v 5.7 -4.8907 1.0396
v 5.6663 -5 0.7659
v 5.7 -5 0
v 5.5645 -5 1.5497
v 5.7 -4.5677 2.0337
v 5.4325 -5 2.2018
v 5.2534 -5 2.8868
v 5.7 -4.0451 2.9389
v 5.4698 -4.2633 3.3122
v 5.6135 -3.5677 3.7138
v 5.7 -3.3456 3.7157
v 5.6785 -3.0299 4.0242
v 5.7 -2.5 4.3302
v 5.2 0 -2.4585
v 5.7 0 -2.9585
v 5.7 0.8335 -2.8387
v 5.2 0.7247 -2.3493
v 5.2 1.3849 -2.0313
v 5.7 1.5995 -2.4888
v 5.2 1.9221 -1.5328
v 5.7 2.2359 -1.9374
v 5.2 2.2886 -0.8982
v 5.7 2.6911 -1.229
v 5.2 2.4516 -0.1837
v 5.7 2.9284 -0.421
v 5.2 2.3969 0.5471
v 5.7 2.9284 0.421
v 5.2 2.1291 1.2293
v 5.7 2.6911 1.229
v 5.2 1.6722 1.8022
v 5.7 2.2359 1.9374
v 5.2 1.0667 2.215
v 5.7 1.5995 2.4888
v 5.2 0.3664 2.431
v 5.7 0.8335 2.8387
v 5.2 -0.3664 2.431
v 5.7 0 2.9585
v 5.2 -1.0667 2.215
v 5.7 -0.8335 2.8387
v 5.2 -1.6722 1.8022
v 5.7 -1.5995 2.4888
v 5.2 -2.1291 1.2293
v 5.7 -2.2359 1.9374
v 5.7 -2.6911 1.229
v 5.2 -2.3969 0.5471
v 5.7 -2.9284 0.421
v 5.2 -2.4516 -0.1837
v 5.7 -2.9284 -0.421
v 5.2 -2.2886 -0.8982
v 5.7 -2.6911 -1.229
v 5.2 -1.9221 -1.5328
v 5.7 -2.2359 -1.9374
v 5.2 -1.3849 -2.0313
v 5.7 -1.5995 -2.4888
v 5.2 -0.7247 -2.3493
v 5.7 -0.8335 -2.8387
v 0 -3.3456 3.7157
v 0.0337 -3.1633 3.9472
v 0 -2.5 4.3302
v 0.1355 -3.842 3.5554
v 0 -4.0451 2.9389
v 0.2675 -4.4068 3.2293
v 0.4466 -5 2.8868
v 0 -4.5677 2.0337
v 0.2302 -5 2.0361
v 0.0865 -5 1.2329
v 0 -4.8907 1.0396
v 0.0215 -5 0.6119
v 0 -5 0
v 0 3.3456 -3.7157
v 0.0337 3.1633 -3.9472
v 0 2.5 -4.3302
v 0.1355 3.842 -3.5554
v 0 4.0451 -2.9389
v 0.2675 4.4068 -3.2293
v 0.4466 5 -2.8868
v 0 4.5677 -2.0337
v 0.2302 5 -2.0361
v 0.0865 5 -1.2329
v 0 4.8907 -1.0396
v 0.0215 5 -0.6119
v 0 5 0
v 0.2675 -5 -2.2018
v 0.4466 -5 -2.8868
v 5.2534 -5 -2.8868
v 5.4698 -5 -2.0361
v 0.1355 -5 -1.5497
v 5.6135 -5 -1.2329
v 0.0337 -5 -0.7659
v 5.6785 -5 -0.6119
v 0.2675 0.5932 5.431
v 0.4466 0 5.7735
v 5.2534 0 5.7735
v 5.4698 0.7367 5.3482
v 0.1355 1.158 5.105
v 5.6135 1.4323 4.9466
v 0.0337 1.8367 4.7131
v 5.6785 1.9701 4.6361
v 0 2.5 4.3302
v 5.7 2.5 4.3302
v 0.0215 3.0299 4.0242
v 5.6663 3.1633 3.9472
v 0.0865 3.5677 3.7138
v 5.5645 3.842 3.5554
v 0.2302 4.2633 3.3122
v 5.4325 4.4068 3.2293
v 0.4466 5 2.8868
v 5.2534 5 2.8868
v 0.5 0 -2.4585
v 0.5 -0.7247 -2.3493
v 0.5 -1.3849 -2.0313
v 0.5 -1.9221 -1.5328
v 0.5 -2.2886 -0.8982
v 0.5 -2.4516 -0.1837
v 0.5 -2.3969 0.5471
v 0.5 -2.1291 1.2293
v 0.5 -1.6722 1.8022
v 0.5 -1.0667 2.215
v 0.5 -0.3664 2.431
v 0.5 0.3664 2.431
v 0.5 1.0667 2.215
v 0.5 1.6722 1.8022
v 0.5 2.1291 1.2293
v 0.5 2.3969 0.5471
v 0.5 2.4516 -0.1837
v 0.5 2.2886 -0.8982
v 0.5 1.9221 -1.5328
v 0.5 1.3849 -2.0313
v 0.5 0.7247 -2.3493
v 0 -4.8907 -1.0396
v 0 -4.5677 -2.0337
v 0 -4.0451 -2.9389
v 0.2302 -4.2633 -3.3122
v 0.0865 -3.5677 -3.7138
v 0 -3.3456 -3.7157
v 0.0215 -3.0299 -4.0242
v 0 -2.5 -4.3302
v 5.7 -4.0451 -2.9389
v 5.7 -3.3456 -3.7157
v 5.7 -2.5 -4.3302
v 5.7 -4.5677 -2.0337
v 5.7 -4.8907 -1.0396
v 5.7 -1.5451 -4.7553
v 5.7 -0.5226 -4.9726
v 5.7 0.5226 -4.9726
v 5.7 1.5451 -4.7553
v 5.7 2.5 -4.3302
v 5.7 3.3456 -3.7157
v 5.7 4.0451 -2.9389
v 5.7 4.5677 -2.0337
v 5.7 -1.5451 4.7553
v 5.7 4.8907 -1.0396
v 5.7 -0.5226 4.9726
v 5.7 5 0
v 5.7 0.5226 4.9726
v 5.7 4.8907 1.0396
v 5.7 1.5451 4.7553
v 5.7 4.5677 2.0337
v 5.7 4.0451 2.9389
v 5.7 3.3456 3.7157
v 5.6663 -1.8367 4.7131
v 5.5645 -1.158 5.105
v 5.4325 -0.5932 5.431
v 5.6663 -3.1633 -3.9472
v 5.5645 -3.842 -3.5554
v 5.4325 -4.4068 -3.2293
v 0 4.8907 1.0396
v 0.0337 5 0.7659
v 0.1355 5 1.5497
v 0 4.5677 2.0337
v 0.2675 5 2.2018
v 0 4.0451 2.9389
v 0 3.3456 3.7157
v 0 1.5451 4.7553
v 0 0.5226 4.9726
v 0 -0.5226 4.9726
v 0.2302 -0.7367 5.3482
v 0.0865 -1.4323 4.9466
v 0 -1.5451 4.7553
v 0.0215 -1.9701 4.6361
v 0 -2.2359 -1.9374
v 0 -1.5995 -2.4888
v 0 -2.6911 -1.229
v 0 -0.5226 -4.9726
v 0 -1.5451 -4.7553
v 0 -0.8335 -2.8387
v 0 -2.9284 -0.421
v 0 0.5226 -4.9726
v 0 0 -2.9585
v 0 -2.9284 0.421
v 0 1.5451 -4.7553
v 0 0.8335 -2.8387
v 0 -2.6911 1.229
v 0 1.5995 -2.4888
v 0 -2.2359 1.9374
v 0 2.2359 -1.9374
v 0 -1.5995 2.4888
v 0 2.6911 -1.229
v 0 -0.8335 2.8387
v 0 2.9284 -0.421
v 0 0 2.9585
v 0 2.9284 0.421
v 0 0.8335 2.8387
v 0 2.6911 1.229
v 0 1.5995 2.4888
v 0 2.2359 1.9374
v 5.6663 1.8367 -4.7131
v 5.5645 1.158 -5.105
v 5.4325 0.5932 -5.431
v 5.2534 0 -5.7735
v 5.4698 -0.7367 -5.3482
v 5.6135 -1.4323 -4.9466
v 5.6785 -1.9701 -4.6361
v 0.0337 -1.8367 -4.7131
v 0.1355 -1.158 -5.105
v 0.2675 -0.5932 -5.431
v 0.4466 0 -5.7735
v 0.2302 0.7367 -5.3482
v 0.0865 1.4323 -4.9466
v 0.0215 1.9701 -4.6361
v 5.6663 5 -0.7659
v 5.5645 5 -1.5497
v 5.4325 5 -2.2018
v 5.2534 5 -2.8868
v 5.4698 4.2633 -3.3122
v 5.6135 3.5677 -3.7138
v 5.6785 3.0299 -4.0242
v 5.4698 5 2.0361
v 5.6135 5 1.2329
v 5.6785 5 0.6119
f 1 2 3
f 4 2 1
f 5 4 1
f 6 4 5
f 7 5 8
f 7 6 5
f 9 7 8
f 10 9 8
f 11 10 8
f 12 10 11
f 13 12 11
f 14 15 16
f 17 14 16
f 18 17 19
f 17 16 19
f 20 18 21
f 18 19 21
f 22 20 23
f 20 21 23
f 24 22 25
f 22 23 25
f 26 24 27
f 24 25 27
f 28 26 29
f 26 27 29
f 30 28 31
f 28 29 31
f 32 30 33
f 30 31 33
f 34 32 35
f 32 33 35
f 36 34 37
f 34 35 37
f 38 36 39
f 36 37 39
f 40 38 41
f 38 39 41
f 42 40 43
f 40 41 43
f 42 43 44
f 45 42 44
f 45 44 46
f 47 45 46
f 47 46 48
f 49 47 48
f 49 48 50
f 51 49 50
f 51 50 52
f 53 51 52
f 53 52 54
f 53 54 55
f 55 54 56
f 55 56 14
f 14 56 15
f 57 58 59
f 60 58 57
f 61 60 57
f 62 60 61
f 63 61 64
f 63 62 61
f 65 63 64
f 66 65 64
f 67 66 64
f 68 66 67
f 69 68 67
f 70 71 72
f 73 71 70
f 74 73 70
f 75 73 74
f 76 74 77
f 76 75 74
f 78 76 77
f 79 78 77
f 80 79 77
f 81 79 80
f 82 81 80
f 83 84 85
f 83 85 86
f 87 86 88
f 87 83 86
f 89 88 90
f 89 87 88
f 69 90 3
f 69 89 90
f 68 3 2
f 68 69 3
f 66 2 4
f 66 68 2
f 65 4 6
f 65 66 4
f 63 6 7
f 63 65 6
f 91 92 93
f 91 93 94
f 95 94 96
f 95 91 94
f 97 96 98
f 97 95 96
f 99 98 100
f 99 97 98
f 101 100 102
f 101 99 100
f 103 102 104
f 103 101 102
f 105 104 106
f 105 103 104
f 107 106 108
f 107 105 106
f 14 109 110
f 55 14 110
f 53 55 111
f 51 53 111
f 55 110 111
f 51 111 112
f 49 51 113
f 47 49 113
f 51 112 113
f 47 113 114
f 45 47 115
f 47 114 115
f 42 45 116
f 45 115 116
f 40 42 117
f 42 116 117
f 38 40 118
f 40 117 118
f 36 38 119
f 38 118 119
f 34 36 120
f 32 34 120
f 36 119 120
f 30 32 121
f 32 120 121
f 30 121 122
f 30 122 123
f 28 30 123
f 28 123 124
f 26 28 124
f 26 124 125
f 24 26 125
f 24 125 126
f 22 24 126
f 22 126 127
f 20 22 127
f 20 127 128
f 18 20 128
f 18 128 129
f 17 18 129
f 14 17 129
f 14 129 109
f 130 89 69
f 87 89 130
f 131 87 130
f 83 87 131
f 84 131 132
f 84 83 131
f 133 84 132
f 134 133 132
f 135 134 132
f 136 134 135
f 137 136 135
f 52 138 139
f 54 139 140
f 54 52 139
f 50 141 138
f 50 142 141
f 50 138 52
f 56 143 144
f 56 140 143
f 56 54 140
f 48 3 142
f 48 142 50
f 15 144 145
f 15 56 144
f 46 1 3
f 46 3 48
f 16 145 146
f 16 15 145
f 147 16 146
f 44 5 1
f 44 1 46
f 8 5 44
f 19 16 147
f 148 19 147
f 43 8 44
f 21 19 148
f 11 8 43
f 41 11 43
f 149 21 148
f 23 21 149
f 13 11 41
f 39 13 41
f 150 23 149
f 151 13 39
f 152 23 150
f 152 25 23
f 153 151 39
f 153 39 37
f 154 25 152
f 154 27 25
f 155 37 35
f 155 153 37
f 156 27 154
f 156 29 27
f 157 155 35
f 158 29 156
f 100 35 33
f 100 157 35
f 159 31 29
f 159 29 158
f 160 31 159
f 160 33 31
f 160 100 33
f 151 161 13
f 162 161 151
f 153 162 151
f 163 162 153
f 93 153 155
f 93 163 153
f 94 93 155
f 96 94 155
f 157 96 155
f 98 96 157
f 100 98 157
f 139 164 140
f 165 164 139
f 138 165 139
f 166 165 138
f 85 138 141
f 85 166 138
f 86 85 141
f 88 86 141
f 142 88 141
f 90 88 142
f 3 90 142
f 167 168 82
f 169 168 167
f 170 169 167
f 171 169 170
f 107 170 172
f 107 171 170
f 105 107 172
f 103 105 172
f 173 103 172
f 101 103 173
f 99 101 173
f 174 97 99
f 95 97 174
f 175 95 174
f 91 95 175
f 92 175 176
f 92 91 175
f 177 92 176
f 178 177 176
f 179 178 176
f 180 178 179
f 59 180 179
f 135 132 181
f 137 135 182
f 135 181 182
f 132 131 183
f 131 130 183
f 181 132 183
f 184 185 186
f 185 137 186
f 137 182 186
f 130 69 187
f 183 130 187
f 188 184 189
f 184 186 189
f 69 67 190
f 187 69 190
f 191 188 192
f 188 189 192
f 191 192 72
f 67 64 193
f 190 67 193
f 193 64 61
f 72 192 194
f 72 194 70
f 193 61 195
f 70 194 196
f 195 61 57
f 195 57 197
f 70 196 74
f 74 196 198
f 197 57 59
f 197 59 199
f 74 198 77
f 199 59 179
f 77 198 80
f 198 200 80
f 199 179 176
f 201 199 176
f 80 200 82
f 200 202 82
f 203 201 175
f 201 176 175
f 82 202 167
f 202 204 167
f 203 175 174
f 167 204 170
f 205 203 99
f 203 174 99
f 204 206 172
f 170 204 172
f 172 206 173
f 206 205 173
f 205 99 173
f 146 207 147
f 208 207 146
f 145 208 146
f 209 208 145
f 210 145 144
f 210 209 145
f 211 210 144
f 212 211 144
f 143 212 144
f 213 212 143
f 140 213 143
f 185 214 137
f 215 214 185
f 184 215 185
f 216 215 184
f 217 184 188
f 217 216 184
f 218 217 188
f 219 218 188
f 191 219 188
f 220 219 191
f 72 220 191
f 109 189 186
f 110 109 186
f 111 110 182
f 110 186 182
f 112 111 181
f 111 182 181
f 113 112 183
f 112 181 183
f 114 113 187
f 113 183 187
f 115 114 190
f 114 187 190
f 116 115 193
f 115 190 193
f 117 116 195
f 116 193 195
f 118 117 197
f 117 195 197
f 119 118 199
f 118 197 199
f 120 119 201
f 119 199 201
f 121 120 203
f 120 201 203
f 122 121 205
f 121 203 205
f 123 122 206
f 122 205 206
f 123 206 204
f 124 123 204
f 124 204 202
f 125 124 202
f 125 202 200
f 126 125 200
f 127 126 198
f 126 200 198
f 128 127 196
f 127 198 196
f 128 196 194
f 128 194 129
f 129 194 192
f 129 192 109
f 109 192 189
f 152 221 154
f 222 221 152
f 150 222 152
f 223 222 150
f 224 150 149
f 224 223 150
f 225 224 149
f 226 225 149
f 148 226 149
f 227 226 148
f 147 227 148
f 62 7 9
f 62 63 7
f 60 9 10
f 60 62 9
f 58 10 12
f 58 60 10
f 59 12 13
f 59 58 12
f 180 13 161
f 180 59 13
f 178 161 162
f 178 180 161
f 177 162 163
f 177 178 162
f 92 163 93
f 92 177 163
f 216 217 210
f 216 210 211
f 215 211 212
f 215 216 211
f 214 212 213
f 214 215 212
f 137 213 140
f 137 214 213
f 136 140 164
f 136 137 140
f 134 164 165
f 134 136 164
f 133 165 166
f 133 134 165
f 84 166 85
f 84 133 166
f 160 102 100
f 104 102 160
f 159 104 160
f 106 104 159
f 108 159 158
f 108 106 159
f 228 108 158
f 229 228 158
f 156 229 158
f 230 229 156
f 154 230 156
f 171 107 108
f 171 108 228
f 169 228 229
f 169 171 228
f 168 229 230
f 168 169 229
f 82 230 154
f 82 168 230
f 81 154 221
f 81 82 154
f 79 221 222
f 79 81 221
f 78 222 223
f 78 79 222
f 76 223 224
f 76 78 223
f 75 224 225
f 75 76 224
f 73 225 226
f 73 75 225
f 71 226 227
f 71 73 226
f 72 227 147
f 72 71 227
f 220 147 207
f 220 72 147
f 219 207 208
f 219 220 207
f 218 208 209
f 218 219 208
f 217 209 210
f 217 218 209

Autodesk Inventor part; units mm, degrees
sketch "Sketch1" plane through (0, 0, 0) normal (1, 0, 0) x (0, 1, 0)
  line L0 (5, 2.8868) -> (5, -2.8868)
  line L1 (5, -2.8868) -> (0, -5.7735)
  line L2 (0, -5.7735) -> (-5, -2.8868)
  line L3 (-5, -2.8868) -> (-5, 2.8868)
  line L4 (-5, 2.8868) -> (0, 5.7735)
  line L5 (0, 5.7735) -> (5, 2.8868)
  circle A0 centre (0, 0) radius 5 construction
  dimension "d0" = 10
extrude "Extrusion1" add sketch "Sketch1" along normal blind 5.7
sketch "Sketch2" plane through (5.7, 0, 0) normal (1, 0, 0) x (0, 1, 0)
  line L0 (-5, 2.8868) -> (0, 5.7735) projected
  line L1 (0, -5.7735) -> (-5, -2.8868) projected
  line L2 (-5, 2.8868) -> (5, -2.8868) construction
  line L3 (-5, -2.8868) -> (5, 2.8868) construction
  point P0 (0, 0)
hole "Hole1" at (5.7, 0, 0) direction (-1, 0, 0) diameter 4.917 end through all thread size "M6x1" class "6H" standard "ISO Metric profile"
chamfer "Chamfer1" distance 0.5 angle 45 2 edges at (5.7, 0, 2.4585) (0, 0, 2.4585)
sketch "Sketch3" plane through (0, 0, 0) normal (0, 1, 0) x (-1, 0, 0)
  line L0 (-7.0172, 0) -> (2.1698, 0) projected
  line L1 (-5.7048, 0) -> (0.8574, 0)
  line L2 (-5.7, 0) -> (-5.7, -5.7735)
  line L3 (-5.7, -5.7735) -> (0, -5.7735)
  line L4 (0, -5.7735) -> (0, 0)
  line L5 (-5.7, -2.8868) -> (-5.7, -5.7735) projected
  line L6 (0, -2.8868) -> (0, -5.7735) projected
  line L7 (0, -5.7735) -> (-5.7, -5.7735) projected
  line L8 (-5.7, -5) -> (-5.2534, -5.7735)
  line L9 (-5.7, -5.7735) -> (-5.7, -5)
  line L10 (-5.7, -5.7735) -> (-5.2534, -5.7735)
  line L11 (0, -5) -> (-0.4466, -5.7735)
  line L12 (-0.4466, -5.7735) -> (0, -5.7735)
  line L13 (0, -5.7735) -> (0, -5)
  dimension "d32" = 5
  dimension "d33" = 30
revolve "Revolution1" cut sketch "Sketch3" angle 360 about axis through (0, 0, 0) along (-1, 0, 0) contours L8 L3 L2 | L4 L3 L11
ref_plane "MSC_PT1" through (5.7, 0, 0) normal (1, 0, 0) x (0, 1, 0)
ref_plane "MSC_PT2" through (0, 0, 0) normal (-1, 0, 0) x (0, -1, 0)
ref_plane "MSC_PF1" through (0, 0, 0) normal (1, 0, 0) x (0, 1, 0)
equation "\"d0\" = Smax"
equation "\"d1\" = Mmax"
equation "\"d10\" = 0.5 * PTC"
equation "\"d32\" = 0.5 * Smax"
equation "\"NND\" = 6"
equation "\"Smax\" = 10"
equation "\"Mmax\" = 5.7"
equation "\"PTC\" = 1"
equation "\"THREADDIA\" = NND"
equation "\"TEMPLATE\" = 1.2345"
properties part number "ANSI B18.2.4.2M - M6x1" material "Steel, Mild"
